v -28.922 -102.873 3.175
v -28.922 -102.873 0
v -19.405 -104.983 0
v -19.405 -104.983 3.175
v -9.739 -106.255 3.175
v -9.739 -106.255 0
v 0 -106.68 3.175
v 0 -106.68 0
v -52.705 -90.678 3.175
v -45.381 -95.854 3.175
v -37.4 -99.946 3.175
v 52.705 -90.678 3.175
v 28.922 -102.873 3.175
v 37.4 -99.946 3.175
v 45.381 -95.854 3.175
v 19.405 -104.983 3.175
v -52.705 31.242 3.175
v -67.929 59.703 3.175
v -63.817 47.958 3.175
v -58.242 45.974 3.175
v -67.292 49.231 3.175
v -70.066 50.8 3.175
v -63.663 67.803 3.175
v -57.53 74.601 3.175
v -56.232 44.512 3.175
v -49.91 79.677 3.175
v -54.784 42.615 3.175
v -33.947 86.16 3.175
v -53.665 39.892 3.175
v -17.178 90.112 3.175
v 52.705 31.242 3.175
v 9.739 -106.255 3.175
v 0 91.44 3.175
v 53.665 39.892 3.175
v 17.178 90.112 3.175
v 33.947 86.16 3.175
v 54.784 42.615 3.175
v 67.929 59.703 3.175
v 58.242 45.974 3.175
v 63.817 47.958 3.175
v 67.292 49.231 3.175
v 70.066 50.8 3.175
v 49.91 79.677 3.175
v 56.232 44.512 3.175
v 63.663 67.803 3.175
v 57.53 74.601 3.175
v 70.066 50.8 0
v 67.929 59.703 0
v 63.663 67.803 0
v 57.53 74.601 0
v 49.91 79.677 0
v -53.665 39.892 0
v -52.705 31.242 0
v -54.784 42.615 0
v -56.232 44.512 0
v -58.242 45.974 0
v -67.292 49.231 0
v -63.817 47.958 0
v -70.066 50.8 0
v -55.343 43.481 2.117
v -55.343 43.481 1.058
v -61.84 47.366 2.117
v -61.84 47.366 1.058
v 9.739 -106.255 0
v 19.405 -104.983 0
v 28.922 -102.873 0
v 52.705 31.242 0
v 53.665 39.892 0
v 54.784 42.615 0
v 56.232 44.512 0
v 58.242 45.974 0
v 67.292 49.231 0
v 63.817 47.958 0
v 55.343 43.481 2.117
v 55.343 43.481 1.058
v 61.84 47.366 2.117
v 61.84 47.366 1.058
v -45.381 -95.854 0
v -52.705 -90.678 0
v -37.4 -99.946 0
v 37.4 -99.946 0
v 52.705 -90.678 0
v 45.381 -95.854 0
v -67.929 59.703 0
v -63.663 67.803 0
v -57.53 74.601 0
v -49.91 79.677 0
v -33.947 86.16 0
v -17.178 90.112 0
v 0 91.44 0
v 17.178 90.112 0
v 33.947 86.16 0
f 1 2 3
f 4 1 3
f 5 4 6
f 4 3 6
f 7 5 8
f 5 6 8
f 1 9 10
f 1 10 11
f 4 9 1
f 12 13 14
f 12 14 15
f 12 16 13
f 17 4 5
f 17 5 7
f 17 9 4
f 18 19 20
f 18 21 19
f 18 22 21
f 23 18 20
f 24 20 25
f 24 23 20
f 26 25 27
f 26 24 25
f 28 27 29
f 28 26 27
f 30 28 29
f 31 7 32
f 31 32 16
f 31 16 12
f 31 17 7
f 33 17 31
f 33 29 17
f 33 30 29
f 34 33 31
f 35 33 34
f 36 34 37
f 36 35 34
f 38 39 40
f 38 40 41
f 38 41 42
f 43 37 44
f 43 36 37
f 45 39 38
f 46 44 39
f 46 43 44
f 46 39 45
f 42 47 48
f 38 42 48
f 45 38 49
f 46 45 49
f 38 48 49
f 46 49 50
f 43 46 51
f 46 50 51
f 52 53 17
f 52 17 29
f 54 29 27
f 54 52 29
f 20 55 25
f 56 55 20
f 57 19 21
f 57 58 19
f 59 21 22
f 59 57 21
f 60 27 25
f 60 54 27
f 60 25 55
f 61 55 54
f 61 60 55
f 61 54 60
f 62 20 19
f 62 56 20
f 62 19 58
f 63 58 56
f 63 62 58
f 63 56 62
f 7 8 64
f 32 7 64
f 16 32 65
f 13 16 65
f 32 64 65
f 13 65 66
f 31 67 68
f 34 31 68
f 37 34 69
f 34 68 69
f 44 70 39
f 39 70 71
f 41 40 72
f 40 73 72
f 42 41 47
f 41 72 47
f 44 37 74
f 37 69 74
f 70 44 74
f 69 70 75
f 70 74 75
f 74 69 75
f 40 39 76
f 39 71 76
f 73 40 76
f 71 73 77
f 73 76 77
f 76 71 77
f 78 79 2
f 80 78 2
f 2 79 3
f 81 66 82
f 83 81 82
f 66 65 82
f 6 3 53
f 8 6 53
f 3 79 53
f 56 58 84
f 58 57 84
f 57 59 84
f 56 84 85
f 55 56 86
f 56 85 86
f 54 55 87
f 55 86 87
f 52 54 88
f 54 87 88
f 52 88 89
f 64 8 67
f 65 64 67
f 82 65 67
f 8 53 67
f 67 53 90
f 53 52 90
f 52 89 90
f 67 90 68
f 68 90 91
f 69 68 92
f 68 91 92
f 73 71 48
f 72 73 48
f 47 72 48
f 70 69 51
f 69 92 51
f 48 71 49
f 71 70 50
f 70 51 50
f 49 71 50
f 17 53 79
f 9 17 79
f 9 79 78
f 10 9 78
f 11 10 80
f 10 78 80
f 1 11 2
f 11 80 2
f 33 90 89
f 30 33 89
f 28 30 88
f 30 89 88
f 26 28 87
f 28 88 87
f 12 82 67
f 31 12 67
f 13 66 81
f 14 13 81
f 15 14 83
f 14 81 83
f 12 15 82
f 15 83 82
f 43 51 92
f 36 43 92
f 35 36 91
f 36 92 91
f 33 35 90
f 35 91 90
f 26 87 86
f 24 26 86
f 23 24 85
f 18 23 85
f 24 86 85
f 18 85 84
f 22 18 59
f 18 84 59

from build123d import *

# Parameters (mm, degrees)
F1_DEPTH = 3.175


with BuildPart() as f1:
    # F0 (on Top) → F1 (new body)
    with BuildSketch(Plane.XY):
        with BuildLine():
            ThreePointArc((28.922397, -102.872733), (41.462552, -98.040783), (52.705, -90.678))
            Line((52.705, -90.678), (52.705, 31.242))
            add(Edge.make_bspline(
                [(52.705, 31.242), (52.705, 50.292), (61.6839, 44.958), (70.0659, 50.8)],
                knots=[0, 0, 0, 0, 26.151792, 26.151792, 26.151792, 26.151792], degree=3))
            ThreePointArc((70.0659, 50.8), (63.662757, 67.803409), (49.909777, 79.676559))
            ThreePointArc((49.909777, 79.676559), (25.638664, 88.459394), (0, 91.44))
            ThreePointArc((0, 91.44), (-25.638664, 88.459394), (-49.909777, 79.676559))
            ThreePointArc((-49.909777, 79.676559), (-63.662757, 67.803409), (-70.0659, 50.8))
            add(Edge.make_bspline(
                [(-52.705, 31.242), (-52.705, 50.292), (-61.6839, 44.958), (-70.0659, 50.8)],
                knots=[0, 0, 0, 0, 26.151792, 26.151792, 26.151792, 26.151792], degree=3))
            Line((-52.705, 31.242), (-52.705, -90.678))
            ThreePointArc((-52.705, -90.678), (-41.462552, -98.040783), (-28.922397, -102.872733))
            ThreePointArc((-28.922397, -102.872733), (-14.585955, -105.724095), (0, -106.68))
            ThreePointArc((0, -106.68), (14.585955, -105.724095), (28.922397, -102.872733))
        make_face()
    extrude(amount=F1_DEPTH)


solid = f1.part
